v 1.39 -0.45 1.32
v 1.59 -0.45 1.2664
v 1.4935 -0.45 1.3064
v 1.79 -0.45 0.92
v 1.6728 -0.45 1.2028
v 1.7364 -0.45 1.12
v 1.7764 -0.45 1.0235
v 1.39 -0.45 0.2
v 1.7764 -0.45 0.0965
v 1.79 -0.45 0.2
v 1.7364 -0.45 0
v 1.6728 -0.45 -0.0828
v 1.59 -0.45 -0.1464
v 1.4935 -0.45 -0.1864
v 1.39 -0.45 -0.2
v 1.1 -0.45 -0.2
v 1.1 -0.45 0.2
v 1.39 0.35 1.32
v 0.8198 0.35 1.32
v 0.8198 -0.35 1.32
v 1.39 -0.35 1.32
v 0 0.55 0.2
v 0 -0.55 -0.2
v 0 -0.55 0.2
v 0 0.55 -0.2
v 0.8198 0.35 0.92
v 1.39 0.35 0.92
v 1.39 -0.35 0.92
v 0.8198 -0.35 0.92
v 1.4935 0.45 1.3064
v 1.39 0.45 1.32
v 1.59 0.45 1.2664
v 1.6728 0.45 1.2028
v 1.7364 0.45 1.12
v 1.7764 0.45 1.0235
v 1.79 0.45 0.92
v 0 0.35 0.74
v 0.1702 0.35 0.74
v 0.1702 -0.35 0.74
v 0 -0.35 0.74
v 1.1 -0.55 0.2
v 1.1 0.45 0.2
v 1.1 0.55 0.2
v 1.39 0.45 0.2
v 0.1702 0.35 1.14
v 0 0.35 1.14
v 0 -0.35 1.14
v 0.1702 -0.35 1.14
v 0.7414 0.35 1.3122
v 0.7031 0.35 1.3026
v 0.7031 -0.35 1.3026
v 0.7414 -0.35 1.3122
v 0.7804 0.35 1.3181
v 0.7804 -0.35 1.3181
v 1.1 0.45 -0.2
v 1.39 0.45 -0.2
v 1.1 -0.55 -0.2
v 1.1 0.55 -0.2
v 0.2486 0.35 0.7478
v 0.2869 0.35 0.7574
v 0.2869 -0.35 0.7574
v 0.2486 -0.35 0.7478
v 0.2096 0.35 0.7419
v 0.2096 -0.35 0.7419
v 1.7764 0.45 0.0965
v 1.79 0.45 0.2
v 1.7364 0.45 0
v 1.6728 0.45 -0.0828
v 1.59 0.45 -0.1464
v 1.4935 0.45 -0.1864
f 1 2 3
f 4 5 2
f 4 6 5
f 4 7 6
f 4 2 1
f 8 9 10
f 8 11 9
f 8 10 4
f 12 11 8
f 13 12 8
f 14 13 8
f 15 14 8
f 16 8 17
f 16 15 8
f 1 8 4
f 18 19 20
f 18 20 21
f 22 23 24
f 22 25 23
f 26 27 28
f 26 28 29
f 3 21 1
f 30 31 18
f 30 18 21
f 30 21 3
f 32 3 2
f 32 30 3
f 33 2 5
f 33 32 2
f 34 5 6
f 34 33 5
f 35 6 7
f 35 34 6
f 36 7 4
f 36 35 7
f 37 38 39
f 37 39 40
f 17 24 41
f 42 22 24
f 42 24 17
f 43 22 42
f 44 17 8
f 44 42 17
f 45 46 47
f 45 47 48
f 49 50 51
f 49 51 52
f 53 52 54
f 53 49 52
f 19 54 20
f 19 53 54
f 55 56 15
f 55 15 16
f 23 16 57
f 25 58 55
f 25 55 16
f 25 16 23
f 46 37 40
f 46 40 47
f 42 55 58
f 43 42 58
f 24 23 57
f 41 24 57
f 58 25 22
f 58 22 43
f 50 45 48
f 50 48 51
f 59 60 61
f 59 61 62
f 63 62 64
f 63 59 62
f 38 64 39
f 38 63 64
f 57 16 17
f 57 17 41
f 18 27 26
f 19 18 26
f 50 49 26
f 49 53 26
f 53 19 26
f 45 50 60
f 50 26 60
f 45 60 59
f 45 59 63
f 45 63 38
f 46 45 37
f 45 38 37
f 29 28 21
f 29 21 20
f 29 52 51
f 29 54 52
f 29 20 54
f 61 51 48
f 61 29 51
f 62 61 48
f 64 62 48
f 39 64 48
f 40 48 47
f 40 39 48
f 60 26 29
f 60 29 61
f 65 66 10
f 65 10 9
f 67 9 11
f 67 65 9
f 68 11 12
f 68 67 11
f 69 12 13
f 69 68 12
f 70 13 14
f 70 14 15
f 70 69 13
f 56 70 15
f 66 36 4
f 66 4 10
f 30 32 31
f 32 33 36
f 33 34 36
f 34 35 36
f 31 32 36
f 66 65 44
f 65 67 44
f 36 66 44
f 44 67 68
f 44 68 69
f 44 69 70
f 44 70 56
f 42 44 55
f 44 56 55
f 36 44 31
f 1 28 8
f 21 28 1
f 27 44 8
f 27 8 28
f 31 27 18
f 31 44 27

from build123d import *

# Parameters (mm, degrees)
BOSS_EXTRUDE1_DEPTH = 0.55
SKETCH4_W           = 1.309613551
SKETCH4_H           = 0.1
CUT_EXTRUDE1_DEPTH  = 3.411845766
SKETCH5_W           = 1.39
SKETCH5_H           = 0.983113088
CUT_EXTRUDE2_DEPTH  = 3.095280411


with BuildPart() as part:
    # Sketch1 → Boss-Extrude1 (new, symmetric)
    with BuildSketch(Plane(origin=(0, 0, 0), x_dir=(1, 0, 0), z_dir=(0, 1, 0))):
        with BuildLine():
            Line((0, -0.2), (1.39, -0.2))
            Line((1.39, -0.2), (1.39, -0.92))
            Line((1.39, -0.92), (0.819829801, -0.92))
            Line((0.819829801, -0.92), (0.286892857, -0.757409068))
            ThreePointArc((0.286892857, -0.757409068), (0.229177094, -0.744376206), (0.170170199, -0.74))
            Line((0.170170199, -0.74), (0, -0.74))
            Line((0, -0.74), (0, -1.14))
            Line((0, -1.14), (0.170170199, -1.14))
            Line((0.170170199, -1.14), (0.703107143, -1.302590932))
            ThreePointArc((0.703107143, -1.302590932), (0.760822906, -1.315623794), (0.819829801, -1.32))
            Line((0.819829801, -1.32), (1.39, -1.32))
            ThreePointArc((1.39, -1.32), (1.672842712, -1.202842712), (1.79, -0.92))
            Line((1.79, -0.92), (1.79, -0.2))
            ThreePointArc((1.79, -0.2), (1.672842712, 0.082842712), (1.39, 0.2))
            Line((1.39, 0.2), (0, 0.2))
            Line((0, 0.2), (0, -0.2))
        make_face()
    extrude(amount=BOSS_EXTRUDE1_DEPTH, both=True)

    # Sketch4 → Cut-Extrude1 (cut, through all)
    with BuildSketch(Plane(origin=(0, 0, -0.2), x_dir=(-1, 0, 0), z_dir=(0, 0, -1))):
        with Locations((-1.754806776, 0.5)):
            Rectangle(SKETCH4_W, SKETCH4_H)
    cut_extrude1 = extrude(amount=-CUT_EXTRUDE1_DEPTH, mode=Mode.SUBTRACT)

    # Mirror1: Cut-Extrude1 across plane
    add(cut_extrude1.mirror(Plane.ZX), mode=Mode.SUBTRACT)

    # Sketch5 → Cut-Extrude2 (cut, through all)
    with BuildSketch(Plane(origin=(0, 0, 0.74), x_dir=(-1, 0, 0), z_dir=(0, 0, -1))):
        with Locations((-0.695, 0.841556544)):
            Rectangle(SKETCH5_W, SKETCH5_H)
    cut_extrude2 = extrude(amount=-CUT_EXTRUDE2_DEPTH, mode=Mode.SUBTRACT)

    # Mirror2: Cut-Extrude2 across plane
    add(cut_extrude2.mirror(Plane.ZX), mode=Mode.SUBTRACT)


solid = part.part
